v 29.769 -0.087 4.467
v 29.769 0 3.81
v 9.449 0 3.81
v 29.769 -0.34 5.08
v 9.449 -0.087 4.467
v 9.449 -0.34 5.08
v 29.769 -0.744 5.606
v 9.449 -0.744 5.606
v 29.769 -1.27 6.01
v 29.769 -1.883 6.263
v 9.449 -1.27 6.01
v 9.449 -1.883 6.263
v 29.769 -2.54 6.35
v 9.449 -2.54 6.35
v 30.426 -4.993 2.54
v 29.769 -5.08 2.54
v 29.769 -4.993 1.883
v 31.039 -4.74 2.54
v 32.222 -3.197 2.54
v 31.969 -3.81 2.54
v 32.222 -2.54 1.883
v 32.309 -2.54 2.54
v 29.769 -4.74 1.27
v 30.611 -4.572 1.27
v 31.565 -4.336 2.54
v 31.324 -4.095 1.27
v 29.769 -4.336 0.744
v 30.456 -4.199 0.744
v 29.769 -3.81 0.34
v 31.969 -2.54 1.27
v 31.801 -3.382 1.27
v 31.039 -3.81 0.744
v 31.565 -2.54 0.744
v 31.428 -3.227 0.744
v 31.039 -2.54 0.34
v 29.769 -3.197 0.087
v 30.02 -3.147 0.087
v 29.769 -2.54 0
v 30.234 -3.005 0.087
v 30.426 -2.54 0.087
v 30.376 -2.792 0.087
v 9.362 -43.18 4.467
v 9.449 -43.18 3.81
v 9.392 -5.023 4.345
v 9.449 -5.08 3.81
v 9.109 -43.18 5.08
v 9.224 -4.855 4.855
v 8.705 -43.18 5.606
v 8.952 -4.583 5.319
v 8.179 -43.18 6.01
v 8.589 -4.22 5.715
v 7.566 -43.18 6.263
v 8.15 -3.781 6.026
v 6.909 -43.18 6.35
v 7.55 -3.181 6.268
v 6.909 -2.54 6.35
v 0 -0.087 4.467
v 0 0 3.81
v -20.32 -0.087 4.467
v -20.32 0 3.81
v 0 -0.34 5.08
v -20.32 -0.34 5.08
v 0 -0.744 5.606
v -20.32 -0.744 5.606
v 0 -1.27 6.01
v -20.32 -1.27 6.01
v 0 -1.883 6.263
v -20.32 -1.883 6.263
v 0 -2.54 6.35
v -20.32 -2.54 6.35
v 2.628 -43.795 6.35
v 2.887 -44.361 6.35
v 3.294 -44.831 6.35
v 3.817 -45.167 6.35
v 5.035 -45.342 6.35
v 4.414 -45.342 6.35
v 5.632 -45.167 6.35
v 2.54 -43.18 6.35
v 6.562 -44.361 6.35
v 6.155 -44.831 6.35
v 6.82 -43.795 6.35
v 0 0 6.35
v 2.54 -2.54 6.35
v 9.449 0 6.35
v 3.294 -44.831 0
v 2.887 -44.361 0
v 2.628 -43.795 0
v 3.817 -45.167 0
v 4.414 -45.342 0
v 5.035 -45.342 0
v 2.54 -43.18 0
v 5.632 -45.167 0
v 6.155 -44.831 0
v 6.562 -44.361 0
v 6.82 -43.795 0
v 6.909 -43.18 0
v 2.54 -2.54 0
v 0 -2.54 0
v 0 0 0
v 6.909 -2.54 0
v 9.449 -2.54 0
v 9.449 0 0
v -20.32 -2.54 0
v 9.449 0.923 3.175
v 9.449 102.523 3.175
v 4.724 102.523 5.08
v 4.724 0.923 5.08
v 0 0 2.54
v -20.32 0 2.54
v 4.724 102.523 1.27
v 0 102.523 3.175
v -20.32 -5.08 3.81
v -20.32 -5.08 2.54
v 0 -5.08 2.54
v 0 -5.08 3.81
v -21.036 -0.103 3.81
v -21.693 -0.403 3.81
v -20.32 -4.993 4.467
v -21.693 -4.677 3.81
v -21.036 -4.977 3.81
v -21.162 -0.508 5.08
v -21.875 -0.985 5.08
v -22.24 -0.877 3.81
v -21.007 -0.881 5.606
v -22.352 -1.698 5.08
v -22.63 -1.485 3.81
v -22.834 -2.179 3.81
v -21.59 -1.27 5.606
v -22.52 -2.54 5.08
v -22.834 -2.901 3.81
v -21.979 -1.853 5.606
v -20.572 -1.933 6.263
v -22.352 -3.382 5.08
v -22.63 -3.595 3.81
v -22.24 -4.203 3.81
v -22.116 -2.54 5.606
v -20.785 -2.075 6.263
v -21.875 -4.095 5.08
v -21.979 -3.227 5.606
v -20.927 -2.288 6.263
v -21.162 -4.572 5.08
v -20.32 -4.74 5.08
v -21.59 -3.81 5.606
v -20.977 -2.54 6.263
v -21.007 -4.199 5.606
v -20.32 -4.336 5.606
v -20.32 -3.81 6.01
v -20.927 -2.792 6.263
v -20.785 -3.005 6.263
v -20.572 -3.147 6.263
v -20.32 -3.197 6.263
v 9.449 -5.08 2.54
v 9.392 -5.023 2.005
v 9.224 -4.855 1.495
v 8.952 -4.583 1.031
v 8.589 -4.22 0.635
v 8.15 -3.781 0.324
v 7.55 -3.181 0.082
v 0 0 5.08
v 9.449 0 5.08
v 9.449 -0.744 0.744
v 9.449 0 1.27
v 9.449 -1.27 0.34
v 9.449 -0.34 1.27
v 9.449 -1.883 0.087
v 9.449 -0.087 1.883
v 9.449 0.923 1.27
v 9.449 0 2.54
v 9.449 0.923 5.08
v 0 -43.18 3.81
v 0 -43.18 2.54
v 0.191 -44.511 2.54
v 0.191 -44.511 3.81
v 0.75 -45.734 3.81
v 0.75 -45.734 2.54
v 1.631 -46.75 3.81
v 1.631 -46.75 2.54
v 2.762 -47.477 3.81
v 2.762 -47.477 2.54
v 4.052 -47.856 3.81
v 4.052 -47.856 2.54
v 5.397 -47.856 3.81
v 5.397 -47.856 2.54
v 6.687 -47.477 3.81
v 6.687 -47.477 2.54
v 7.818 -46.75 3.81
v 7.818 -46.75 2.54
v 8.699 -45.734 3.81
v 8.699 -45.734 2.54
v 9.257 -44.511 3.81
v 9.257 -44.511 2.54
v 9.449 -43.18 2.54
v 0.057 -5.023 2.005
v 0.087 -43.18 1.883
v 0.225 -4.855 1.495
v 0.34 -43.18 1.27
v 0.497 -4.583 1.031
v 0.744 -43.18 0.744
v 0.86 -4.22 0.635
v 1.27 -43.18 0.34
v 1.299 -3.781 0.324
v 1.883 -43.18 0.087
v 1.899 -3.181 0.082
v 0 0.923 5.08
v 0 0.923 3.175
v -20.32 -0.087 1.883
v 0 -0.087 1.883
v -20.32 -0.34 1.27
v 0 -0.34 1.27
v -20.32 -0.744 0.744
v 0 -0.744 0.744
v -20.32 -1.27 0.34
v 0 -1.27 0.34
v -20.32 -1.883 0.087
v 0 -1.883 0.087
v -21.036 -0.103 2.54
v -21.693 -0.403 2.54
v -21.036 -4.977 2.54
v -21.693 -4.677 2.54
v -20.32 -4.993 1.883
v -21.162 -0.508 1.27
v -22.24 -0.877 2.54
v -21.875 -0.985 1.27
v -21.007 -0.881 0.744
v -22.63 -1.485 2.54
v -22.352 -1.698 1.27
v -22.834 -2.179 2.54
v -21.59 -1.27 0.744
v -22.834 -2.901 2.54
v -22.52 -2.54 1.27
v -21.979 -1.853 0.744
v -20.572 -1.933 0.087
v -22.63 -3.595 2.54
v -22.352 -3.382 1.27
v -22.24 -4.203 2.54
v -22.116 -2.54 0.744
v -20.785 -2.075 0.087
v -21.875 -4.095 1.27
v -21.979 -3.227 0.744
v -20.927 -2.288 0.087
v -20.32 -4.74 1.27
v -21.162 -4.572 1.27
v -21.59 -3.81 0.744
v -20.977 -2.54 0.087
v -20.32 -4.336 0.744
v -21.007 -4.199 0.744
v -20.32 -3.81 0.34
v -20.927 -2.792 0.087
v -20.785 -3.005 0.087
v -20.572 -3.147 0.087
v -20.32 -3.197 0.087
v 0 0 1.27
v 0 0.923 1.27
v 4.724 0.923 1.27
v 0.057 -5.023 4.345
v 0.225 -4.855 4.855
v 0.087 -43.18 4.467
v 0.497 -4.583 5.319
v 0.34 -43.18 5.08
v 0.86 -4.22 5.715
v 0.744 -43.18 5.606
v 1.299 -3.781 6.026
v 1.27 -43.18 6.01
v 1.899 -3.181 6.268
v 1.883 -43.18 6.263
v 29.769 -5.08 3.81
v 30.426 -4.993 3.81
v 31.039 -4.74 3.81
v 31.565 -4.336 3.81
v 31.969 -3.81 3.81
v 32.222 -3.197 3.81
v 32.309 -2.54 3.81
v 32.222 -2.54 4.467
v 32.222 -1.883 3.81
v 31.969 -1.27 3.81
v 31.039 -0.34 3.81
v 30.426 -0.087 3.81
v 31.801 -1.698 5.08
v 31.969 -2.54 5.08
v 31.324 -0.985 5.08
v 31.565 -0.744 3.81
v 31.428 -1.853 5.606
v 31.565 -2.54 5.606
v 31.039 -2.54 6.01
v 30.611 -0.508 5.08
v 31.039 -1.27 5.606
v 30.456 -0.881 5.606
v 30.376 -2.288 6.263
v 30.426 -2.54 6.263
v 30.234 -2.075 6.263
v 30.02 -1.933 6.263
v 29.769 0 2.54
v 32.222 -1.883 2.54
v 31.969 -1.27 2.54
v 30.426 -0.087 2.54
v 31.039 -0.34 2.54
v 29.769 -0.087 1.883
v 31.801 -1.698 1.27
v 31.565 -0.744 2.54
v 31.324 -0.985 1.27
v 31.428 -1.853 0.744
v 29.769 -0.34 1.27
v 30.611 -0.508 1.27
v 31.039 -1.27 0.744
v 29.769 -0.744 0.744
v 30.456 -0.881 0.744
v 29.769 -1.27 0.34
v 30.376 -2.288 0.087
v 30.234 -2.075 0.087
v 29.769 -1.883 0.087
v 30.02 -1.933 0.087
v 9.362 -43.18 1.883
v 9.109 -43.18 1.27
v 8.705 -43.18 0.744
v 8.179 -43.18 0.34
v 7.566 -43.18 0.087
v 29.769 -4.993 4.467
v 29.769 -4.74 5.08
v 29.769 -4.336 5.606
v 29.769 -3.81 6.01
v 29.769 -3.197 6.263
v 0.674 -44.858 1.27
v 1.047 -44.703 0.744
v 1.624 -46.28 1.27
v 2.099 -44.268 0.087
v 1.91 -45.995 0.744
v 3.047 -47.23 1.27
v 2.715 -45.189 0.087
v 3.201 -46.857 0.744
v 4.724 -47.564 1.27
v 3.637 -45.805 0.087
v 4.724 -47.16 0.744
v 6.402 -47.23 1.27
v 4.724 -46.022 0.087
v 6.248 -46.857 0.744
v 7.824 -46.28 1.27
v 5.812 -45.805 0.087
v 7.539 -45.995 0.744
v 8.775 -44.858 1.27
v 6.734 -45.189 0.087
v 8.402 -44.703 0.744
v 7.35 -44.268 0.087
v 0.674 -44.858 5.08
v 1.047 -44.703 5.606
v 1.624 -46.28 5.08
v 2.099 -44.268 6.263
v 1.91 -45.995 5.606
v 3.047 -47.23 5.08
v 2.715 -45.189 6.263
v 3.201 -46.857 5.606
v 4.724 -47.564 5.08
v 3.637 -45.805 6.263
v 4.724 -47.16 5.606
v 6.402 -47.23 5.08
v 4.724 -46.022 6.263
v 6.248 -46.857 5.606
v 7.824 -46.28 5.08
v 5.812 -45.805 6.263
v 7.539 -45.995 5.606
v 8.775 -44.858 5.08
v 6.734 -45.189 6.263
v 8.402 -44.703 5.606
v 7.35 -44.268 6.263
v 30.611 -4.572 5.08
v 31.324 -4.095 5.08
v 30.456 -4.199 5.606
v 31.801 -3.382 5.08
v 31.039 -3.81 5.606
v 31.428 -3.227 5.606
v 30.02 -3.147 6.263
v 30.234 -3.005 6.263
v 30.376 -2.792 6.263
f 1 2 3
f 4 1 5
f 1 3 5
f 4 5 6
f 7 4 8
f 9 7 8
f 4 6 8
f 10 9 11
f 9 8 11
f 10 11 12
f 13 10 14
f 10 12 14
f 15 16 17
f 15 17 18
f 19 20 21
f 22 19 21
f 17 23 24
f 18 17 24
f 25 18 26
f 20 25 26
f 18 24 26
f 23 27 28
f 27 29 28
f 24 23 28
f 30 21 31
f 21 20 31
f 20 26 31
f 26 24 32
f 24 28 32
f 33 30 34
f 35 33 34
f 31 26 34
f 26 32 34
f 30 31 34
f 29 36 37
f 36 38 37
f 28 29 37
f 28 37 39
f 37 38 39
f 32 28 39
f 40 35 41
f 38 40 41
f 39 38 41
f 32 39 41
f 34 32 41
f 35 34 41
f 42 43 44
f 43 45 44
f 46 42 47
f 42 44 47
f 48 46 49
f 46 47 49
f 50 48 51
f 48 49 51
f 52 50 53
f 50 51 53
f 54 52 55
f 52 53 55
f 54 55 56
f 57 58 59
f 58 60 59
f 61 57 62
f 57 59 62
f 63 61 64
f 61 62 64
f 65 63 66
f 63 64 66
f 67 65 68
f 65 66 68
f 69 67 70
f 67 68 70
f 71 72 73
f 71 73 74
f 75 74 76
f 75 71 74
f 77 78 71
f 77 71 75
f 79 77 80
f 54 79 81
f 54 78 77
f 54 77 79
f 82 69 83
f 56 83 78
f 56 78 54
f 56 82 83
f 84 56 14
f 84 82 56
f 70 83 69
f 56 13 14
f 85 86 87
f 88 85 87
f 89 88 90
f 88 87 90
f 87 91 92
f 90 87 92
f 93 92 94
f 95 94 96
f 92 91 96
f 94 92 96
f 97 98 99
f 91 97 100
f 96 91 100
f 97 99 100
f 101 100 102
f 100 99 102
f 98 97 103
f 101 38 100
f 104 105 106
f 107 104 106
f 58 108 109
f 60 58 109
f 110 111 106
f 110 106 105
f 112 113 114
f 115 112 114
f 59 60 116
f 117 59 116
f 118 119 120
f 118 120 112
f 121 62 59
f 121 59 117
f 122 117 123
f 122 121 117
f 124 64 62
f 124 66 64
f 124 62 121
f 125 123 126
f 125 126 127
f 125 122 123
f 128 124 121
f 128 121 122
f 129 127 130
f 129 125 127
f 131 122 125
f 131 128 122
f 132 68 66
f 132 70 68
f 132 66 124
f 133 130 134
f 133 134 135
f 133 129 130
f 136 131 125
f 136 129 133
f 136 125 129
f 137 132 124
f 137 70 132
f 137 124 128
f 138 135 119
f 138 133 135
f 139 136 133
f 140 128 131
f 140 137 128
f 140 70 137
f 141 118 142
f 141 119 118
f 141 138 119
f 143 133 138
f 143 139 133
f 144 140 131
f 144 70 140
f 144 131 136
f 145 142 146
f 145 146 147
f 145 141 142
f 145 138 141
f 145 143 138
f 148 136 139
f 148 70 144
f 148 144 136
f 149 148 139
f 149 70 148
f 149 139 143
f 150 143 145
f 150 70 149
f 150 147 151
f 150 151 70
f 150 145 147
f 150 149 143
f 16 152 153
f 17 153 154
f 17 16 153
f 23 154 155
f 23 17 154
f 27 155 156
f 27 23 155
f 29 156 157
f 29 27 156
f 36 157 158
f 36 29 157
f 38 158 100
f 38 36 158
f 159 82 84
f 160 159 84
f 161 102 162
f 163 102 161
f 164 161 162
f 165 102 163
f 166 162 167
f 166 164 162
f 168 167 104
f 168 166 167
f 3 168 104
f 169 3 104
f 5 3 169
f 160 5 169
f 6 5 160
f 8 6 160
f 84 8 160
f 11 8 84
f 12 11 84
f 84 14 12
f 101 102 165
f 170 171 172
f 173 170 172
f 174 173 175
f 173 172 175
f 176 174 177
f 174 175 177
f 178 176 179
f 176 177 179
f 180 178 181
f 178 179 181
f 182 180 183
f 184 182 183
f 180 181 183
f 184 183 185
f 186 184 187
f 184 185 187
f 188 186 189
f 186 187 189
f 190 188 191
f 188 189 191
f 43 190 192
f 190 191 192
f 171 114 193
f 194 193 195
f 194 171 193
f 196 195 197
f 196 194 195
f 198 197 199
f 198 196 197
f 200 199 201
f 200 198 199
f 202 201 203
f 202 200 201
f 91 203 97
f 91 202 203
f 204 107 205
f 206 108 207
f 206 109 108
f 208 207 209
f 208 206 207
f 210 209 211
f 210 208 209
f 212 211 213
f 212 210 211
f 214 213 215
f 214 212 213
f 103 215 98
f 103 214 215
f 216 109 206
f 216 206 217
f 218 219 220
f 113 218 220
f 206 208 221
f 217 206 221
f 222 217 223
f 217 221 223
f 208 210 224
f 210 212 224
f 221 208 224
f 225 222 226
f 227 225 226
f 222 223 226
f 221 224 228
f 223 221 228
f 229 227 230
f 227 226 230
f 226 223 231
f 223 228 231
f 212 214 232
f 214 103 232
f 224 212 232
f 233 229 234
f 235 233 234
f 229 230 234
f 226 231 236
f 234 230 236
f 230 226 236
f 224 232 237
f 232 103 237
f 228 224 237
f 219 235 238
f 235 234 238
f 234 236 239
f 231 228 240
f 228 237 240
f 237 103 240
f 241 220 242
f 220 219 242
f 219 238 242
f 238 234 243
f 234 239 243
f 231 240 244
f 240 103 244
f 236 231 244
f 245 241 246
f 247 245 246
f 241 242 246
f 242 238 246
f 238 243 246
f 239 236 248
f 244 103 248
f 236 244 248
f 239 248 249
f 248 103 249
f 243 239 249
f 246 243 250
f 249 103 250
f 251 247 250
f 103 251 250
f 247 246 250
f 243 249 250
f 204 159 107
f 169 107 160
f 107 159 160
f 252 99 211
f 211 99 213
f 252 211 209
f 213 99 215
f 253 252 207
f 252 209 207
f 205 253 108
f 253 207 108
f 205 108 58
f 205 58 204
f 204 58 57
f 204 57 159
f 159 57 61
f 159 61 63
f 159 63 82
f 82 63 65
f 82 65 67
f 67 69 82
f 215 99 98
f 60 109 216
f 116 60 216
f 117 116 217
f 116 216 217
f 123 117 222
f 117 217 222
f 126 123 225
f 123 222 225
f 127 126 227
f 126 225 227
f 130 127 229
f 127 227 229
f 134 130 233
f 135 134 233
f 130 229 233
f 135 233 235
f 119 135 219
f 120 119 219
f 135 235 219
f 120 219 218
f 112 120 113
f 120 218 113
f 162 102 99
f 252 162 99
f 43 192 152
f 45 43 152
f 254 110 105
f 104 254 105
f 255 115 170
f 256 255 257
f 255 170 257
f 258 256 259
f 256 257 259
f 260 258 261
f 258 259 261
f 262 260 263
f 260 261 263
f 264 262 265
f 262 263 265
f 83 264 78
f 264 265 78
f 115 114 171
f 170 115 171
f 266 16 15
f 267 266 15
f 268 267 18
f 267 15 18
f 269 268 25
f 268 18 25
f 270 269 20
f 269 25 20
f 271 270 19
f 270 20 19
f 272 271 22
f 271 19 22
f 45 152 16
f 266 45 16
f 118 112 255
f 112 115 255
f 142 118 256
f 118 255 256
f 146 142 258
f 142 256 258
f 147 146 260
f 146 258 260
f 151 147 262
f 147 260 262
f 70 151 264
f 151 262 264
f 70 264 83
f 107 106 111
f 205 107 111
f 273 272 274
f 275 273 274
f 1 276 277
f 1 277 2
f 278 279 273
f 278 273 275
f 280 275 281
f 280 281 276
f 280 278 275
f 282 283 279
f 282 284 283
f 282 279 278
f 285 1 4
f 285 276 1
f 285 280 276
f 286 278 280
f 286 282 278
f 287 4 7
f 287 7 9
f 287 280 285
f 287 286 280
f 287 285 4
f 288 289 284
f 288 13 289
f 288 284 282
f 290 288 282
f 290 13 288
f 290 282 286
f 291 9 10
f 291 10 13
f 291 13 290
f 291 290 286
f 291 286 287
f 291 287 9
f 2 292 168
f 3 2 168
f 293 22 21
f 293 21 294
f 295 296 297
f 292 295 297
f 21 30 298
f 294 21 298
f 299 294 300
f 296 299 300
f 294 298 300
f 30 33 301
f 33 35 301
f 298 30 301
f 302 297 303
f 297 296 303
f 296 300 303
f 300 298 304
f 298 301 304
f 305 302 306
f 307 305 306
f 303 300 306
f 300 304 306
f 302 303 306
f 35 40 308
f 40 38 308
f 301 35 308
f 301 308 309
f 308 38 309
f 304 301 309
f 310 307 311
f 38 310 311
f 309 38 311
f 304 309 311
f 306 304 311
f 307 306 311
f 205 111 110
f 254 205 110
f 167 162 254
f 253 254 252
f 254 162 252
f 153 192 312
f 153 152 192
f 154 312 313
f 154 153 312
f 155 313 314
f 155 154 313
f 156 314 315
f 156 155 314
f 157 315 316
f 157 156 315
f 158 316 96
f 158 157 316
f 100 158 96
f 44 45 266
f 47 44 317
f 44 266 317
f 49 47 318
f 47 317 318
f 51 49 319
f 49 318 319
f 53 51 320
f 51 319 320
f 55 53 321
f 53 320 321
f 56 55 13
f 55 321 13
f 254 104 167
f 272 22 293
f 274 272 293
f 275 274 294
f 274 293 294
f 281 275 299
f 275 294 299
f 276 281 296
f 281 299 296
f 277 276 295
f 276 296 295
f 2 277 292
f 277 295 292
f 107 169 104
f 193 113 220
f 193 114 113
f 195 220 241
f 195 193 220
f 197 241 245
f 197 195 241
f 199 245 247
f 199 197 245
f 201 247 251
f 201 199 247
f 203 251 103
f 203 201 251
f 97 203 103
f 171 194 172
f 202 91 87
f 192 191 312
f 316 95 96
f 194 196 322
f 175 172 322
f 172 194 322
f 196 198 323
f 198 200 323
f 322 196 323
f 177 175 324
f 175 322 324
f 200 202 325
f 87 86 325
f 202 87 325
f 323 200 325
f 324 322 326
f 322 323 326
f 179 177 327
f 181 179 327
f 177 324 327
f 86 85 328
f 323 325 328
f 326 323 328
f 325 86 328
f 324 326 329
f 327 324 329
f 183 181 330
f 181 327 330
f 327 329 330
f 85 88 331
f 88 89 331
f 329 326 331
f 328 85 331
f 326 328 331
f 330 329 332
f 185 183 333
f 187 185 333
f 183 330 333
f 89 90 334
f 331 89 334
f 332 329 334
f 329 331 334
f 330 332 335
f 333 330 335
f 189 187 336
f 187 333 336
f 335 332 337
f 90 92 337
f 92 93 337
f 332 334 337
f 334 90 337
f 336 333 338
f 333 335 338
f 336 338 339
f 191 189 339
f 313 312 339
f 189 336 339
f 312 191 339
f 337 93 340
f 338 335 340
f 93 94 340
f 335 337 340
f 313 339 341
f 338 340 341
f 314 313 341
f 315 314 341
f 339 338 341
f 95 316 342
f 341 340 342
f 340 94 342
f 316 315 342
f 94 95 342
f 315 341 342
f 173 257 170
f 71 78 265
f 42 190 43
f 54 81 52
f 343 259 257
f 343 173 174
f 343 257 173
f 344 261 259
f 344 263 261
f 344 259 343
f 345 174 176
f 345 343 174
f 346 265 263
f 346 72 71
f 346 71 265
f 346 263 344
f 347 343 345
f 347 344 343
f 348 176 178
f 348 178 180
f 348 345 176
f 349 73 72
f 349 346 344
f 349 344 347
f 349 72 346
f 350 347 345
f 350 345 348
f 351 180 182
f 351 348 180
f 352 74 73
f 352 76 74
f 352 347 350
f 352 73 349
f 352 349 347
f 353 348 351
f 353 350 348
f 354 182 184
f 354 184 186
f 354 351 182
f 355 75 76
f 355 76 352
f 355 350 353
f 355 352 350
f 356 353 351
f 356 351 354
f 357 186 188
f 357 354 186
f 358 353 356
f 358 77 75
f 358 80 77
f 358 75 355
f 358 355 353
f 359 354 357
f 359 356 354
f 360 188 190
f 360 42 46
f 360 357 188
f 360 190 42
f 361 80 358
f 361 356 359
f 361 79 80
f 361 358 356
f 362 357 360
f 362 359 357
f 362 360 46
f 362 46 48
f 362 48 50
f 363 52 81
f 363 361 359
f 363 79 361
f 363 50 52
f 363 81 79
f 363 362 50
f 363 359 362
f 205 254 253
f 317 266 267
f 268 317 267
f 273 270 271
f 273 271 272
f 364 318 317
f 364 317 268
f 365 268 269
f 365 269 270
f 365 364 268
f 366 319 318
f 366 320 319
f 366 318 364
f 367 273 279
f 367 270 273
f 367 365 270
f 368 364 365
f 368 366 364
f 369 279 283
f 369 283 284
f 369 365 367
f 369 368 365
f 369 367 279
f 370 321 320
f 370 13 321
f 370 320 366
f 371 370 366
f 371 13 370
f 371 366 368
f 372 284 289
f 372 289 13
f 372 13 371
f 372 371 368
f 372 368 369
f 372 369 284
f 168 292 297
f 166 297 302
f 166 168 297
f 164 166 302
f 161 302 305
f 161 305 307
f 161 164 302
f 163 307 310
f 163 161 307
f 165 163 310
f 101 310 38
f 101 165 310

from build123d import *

# Parameters (mm, degrees)
F0_W      = 4.724400118
F0_H      = 62.3315982521
F1_DEPTH  = 6.35
F2_R      = 2.53999
F4_DEPTH  = 1.27
F6_DEPTH  = 1.27
F8_DEPTH  = 25.4
F9_DEPTH  = 50.8
F11_DEPTH = 25.4
F13_DEPTH = 25.4
F15_DEPTH = 101.6


# Not quite as in the source:
# - a fillet or chamfer is up to 0.001 mm smaller than in the source, because OpenCascade refuses the exact size


with BuildPart() as f1:
    # F0 (on Top) → F1 (new body)
    with BuildSketch(Plane.XY):
        with Locations((2.362200059, 31.165799126)):
            Rectangle(F0_W, F0_H)
        with Locations((7.086600177, 31.165799126)):
            Rectangle(F0_W, F0_H)
        Polygon((4.724400118, 75.0454813242), (4.724400118, 62.3315982521), (9.448800236, 62.3315982521), align=None)
        Polygon((4.724400118, 75.0454813242), (0, 62.3315982521), (4.724400118, 62.3315982521), align=None)
        with BuildLine():
            Line((4.724400118, 0), (0, 0))
            Line((0, 0), (-20.32, 0))
            ThreePointArc((-20.32, 0), (-18.5239487758, -0.7439487758), (-17.78, -2.54))
            ThreePointArc((-17.78, -2.54), (-18.5239487758, -4.3360512242), (-20.32, -5.08))
            Line((-20.32, -5.08), (0, -5.08))
            Line((0, -5.08), (9.448800236, -5.08))
            Line((9.448800236, -5.08), (29.768800236, -5.08))
            ThreePointArc((29.768800236, -5.08), (27.228800236, -2.54), (29.768800236, 0))
            Line((29.768800236, 0), (9.448800236, 0))
            Line((9.448800236, 0), (4.724400118, 0))
        make_face()
        with BuildLine():
            Line((9.448800236, -5.08), (0, -5.08))
            Line((0, -5.08), (0, -43.18))
            ThreePointArc((0, -43.18), (4.724400118, -38.455599882), (9.448800236, -43.18))
            Line((9.448800236, -43.18), (9.448800236, -5.08))
        make_face()
        with BuildLine():
            ThreePointArc((-17.78, -2.54), (-18.5239487758, -0.7439487758), (-20.32, 0))
            Line((-20.32, 0), (-20.32, -5.08))
            ThreePointArc((-20.32, -5.08), (-18.5239487758, -4.3360512242), (-17.78, -2.54))
        make_face()
        with BuildLine():
            Line((-20.32, -5.08), (-20.32, 0))
            ThreePointArc((-20.32, 0), (-22.86, -2.54), (-20.32, -5.08))
        make_face()
        with BuildLine():
            Line((29.768800236, -5.08), (29.768800236, 0))
            ThreePointArc((29.768800236, 0), (27.228800236, -2.54), (29.768800236, -5.08))
        make_face()
        with BuildLine():
            ThreePointArc((32.308800236, -2.54), (31.5648514602, -0.7439487758), (29.768800236, 0))
            Line((29.768800236, 0), (29.768800236, -5.08))
            ThreePointArc((29.768800236, -5.08), (31.5648514602, -4.3360512242), (32.308800236, -2.54))
        make_face()
        with BuildLine():
            Line((9.448800236, -43.18), (0, -43.18))
            ThreePointArc((0, -43.18), (4.724400118, -47.904400118), (9.448800236, -43.18))
        make_face()
        with BuildLine():
            ThreePointArc((9.448800236, -43.18), (4.724400118, -38.455599882), (0, -43.18))
            Line((0, -43.18), (9.448800236, -43.18))
        make_face()
    extrude(amount=F1_DEPTH)

    # F2 (radius 2.54 in the source; OpenCascade refuses exactly that, so slightly less here)
    f2_edges = [f1.edges().sort_by_distance(p)[0] for p in [
        (0, -24.13, 6.35),
        (9.4488, -24.13, 6.35),
        (0, -24.13, 0),
        (9.4488, -24.13, 0),
        (19.6088, -5.08, 0),
        (19.6088, 0, 0),
        (-10.16, 0, 0),
        (19.6088, -5.08, 6.35),
        (19.6088, 0, 6.35),
        (-10.16, -5.08, 6.35),
        (-10.16, 0, 6.35),
        (-10.16, -5.08, 0),
    ]]
    fillet(f2_edges, radius=F2_R)

    # F3 (on face) → F4 (cut)
    with BuildSketch(Plane.XY.offset(6.35)):
        Polygon((0, 62.3315982521), (0, 0), (9.448800236, 0), (9.448800236, 62.3315982521), (4.724400118, 75.0454813242), align=None)
    extrude(amount=-F4_DEPTH, mode=Mode.SUBTRACT)

    # F5 (on face) → F6 (cut)
    with BuildSketch(Plane(origin=(0, 0, 0), x_dir=(1, 0, 0), z_dir=(0, 0, -1))):
        Polygon((9.448800236, 0), (0, 0), (0, -62.3315982521), (4.724400118, -75.0454813242), (9.448800236, -62.3315982521), align=None)
    extrude(amount=-F6_DEPTH, mode=Mode.SUBTRACT)

    # F7 (on face) → F8 (cut)
    with BuildSketch(Plane.XY.offset(5.08)):
        Polygon((4.724400118, 75.0454813242), (0, 62.3315982521), (9.448800236, 62.3315982521), align=None)
    extrude(amount=-F8_DEPTH, mode=Mode.SUBTRACT)

    # F9 (add): a face of the model
    f9_faces = [f1.faces().sort_by_distance(p)[0] for p in [
        (4.724400118, 62.3315982521, 3.175),
    ]]
    extrude(f9_faces, amount=F9_DEPTH)

    # F10 (on face) → F11 (cut)
    with BuildSketch(Plane.XY.offset(5.08)):
        Polygon((0, 102.5230064988), (4.724400118, 113.1315982521), (0, 113.1315982521), align=None)
        Polygon((9.448800236, 113.1315982521), (4.724400118, 113.1315982521), (9.448800236, 102.5230064988), align=None)
    extrude(amount=-F11_DEPTH, mode=Mode.SUBTRACT)

    # F12 (on face) → F13 (cut)
    with BuildSketch(Plane.XY.offset(5.08)):
        Polygon((4.724400118, 113.1315982521), (0, 102.5230064988), (9.448800236, 102.5230064988), align=None)
    extrude(amount=-F13_DEPTH, mode=Mode.SUBTRACT)

    # F14 (on face) → F15 (cut)
    with BuildSketch(Plane(origin=(0, 102.5230064988, 0), x_dir=(-1, 0, 0), z_dir=(0, 1, 0))):
        Polygon((0, 5.08), (-4.724400118, 5.08), (0, 3.175), align=None)
        Polygon((0, 1.27), (0, 3.175), (-4.724400118, 1.27), align=None)
        Polygon((-4.724400118, 1.27), (-9.448800236, 3.175), (-9.448800236, 1.27), align=None)
        Polygon((-9.448800236, 3.175), (-4.724400118, 5.08), (-9.448800236, 5.08), align=None)
    extrude(amount=-F15_DEPTH, mode=Mode.SUBTRACT)


solid = f1.part
